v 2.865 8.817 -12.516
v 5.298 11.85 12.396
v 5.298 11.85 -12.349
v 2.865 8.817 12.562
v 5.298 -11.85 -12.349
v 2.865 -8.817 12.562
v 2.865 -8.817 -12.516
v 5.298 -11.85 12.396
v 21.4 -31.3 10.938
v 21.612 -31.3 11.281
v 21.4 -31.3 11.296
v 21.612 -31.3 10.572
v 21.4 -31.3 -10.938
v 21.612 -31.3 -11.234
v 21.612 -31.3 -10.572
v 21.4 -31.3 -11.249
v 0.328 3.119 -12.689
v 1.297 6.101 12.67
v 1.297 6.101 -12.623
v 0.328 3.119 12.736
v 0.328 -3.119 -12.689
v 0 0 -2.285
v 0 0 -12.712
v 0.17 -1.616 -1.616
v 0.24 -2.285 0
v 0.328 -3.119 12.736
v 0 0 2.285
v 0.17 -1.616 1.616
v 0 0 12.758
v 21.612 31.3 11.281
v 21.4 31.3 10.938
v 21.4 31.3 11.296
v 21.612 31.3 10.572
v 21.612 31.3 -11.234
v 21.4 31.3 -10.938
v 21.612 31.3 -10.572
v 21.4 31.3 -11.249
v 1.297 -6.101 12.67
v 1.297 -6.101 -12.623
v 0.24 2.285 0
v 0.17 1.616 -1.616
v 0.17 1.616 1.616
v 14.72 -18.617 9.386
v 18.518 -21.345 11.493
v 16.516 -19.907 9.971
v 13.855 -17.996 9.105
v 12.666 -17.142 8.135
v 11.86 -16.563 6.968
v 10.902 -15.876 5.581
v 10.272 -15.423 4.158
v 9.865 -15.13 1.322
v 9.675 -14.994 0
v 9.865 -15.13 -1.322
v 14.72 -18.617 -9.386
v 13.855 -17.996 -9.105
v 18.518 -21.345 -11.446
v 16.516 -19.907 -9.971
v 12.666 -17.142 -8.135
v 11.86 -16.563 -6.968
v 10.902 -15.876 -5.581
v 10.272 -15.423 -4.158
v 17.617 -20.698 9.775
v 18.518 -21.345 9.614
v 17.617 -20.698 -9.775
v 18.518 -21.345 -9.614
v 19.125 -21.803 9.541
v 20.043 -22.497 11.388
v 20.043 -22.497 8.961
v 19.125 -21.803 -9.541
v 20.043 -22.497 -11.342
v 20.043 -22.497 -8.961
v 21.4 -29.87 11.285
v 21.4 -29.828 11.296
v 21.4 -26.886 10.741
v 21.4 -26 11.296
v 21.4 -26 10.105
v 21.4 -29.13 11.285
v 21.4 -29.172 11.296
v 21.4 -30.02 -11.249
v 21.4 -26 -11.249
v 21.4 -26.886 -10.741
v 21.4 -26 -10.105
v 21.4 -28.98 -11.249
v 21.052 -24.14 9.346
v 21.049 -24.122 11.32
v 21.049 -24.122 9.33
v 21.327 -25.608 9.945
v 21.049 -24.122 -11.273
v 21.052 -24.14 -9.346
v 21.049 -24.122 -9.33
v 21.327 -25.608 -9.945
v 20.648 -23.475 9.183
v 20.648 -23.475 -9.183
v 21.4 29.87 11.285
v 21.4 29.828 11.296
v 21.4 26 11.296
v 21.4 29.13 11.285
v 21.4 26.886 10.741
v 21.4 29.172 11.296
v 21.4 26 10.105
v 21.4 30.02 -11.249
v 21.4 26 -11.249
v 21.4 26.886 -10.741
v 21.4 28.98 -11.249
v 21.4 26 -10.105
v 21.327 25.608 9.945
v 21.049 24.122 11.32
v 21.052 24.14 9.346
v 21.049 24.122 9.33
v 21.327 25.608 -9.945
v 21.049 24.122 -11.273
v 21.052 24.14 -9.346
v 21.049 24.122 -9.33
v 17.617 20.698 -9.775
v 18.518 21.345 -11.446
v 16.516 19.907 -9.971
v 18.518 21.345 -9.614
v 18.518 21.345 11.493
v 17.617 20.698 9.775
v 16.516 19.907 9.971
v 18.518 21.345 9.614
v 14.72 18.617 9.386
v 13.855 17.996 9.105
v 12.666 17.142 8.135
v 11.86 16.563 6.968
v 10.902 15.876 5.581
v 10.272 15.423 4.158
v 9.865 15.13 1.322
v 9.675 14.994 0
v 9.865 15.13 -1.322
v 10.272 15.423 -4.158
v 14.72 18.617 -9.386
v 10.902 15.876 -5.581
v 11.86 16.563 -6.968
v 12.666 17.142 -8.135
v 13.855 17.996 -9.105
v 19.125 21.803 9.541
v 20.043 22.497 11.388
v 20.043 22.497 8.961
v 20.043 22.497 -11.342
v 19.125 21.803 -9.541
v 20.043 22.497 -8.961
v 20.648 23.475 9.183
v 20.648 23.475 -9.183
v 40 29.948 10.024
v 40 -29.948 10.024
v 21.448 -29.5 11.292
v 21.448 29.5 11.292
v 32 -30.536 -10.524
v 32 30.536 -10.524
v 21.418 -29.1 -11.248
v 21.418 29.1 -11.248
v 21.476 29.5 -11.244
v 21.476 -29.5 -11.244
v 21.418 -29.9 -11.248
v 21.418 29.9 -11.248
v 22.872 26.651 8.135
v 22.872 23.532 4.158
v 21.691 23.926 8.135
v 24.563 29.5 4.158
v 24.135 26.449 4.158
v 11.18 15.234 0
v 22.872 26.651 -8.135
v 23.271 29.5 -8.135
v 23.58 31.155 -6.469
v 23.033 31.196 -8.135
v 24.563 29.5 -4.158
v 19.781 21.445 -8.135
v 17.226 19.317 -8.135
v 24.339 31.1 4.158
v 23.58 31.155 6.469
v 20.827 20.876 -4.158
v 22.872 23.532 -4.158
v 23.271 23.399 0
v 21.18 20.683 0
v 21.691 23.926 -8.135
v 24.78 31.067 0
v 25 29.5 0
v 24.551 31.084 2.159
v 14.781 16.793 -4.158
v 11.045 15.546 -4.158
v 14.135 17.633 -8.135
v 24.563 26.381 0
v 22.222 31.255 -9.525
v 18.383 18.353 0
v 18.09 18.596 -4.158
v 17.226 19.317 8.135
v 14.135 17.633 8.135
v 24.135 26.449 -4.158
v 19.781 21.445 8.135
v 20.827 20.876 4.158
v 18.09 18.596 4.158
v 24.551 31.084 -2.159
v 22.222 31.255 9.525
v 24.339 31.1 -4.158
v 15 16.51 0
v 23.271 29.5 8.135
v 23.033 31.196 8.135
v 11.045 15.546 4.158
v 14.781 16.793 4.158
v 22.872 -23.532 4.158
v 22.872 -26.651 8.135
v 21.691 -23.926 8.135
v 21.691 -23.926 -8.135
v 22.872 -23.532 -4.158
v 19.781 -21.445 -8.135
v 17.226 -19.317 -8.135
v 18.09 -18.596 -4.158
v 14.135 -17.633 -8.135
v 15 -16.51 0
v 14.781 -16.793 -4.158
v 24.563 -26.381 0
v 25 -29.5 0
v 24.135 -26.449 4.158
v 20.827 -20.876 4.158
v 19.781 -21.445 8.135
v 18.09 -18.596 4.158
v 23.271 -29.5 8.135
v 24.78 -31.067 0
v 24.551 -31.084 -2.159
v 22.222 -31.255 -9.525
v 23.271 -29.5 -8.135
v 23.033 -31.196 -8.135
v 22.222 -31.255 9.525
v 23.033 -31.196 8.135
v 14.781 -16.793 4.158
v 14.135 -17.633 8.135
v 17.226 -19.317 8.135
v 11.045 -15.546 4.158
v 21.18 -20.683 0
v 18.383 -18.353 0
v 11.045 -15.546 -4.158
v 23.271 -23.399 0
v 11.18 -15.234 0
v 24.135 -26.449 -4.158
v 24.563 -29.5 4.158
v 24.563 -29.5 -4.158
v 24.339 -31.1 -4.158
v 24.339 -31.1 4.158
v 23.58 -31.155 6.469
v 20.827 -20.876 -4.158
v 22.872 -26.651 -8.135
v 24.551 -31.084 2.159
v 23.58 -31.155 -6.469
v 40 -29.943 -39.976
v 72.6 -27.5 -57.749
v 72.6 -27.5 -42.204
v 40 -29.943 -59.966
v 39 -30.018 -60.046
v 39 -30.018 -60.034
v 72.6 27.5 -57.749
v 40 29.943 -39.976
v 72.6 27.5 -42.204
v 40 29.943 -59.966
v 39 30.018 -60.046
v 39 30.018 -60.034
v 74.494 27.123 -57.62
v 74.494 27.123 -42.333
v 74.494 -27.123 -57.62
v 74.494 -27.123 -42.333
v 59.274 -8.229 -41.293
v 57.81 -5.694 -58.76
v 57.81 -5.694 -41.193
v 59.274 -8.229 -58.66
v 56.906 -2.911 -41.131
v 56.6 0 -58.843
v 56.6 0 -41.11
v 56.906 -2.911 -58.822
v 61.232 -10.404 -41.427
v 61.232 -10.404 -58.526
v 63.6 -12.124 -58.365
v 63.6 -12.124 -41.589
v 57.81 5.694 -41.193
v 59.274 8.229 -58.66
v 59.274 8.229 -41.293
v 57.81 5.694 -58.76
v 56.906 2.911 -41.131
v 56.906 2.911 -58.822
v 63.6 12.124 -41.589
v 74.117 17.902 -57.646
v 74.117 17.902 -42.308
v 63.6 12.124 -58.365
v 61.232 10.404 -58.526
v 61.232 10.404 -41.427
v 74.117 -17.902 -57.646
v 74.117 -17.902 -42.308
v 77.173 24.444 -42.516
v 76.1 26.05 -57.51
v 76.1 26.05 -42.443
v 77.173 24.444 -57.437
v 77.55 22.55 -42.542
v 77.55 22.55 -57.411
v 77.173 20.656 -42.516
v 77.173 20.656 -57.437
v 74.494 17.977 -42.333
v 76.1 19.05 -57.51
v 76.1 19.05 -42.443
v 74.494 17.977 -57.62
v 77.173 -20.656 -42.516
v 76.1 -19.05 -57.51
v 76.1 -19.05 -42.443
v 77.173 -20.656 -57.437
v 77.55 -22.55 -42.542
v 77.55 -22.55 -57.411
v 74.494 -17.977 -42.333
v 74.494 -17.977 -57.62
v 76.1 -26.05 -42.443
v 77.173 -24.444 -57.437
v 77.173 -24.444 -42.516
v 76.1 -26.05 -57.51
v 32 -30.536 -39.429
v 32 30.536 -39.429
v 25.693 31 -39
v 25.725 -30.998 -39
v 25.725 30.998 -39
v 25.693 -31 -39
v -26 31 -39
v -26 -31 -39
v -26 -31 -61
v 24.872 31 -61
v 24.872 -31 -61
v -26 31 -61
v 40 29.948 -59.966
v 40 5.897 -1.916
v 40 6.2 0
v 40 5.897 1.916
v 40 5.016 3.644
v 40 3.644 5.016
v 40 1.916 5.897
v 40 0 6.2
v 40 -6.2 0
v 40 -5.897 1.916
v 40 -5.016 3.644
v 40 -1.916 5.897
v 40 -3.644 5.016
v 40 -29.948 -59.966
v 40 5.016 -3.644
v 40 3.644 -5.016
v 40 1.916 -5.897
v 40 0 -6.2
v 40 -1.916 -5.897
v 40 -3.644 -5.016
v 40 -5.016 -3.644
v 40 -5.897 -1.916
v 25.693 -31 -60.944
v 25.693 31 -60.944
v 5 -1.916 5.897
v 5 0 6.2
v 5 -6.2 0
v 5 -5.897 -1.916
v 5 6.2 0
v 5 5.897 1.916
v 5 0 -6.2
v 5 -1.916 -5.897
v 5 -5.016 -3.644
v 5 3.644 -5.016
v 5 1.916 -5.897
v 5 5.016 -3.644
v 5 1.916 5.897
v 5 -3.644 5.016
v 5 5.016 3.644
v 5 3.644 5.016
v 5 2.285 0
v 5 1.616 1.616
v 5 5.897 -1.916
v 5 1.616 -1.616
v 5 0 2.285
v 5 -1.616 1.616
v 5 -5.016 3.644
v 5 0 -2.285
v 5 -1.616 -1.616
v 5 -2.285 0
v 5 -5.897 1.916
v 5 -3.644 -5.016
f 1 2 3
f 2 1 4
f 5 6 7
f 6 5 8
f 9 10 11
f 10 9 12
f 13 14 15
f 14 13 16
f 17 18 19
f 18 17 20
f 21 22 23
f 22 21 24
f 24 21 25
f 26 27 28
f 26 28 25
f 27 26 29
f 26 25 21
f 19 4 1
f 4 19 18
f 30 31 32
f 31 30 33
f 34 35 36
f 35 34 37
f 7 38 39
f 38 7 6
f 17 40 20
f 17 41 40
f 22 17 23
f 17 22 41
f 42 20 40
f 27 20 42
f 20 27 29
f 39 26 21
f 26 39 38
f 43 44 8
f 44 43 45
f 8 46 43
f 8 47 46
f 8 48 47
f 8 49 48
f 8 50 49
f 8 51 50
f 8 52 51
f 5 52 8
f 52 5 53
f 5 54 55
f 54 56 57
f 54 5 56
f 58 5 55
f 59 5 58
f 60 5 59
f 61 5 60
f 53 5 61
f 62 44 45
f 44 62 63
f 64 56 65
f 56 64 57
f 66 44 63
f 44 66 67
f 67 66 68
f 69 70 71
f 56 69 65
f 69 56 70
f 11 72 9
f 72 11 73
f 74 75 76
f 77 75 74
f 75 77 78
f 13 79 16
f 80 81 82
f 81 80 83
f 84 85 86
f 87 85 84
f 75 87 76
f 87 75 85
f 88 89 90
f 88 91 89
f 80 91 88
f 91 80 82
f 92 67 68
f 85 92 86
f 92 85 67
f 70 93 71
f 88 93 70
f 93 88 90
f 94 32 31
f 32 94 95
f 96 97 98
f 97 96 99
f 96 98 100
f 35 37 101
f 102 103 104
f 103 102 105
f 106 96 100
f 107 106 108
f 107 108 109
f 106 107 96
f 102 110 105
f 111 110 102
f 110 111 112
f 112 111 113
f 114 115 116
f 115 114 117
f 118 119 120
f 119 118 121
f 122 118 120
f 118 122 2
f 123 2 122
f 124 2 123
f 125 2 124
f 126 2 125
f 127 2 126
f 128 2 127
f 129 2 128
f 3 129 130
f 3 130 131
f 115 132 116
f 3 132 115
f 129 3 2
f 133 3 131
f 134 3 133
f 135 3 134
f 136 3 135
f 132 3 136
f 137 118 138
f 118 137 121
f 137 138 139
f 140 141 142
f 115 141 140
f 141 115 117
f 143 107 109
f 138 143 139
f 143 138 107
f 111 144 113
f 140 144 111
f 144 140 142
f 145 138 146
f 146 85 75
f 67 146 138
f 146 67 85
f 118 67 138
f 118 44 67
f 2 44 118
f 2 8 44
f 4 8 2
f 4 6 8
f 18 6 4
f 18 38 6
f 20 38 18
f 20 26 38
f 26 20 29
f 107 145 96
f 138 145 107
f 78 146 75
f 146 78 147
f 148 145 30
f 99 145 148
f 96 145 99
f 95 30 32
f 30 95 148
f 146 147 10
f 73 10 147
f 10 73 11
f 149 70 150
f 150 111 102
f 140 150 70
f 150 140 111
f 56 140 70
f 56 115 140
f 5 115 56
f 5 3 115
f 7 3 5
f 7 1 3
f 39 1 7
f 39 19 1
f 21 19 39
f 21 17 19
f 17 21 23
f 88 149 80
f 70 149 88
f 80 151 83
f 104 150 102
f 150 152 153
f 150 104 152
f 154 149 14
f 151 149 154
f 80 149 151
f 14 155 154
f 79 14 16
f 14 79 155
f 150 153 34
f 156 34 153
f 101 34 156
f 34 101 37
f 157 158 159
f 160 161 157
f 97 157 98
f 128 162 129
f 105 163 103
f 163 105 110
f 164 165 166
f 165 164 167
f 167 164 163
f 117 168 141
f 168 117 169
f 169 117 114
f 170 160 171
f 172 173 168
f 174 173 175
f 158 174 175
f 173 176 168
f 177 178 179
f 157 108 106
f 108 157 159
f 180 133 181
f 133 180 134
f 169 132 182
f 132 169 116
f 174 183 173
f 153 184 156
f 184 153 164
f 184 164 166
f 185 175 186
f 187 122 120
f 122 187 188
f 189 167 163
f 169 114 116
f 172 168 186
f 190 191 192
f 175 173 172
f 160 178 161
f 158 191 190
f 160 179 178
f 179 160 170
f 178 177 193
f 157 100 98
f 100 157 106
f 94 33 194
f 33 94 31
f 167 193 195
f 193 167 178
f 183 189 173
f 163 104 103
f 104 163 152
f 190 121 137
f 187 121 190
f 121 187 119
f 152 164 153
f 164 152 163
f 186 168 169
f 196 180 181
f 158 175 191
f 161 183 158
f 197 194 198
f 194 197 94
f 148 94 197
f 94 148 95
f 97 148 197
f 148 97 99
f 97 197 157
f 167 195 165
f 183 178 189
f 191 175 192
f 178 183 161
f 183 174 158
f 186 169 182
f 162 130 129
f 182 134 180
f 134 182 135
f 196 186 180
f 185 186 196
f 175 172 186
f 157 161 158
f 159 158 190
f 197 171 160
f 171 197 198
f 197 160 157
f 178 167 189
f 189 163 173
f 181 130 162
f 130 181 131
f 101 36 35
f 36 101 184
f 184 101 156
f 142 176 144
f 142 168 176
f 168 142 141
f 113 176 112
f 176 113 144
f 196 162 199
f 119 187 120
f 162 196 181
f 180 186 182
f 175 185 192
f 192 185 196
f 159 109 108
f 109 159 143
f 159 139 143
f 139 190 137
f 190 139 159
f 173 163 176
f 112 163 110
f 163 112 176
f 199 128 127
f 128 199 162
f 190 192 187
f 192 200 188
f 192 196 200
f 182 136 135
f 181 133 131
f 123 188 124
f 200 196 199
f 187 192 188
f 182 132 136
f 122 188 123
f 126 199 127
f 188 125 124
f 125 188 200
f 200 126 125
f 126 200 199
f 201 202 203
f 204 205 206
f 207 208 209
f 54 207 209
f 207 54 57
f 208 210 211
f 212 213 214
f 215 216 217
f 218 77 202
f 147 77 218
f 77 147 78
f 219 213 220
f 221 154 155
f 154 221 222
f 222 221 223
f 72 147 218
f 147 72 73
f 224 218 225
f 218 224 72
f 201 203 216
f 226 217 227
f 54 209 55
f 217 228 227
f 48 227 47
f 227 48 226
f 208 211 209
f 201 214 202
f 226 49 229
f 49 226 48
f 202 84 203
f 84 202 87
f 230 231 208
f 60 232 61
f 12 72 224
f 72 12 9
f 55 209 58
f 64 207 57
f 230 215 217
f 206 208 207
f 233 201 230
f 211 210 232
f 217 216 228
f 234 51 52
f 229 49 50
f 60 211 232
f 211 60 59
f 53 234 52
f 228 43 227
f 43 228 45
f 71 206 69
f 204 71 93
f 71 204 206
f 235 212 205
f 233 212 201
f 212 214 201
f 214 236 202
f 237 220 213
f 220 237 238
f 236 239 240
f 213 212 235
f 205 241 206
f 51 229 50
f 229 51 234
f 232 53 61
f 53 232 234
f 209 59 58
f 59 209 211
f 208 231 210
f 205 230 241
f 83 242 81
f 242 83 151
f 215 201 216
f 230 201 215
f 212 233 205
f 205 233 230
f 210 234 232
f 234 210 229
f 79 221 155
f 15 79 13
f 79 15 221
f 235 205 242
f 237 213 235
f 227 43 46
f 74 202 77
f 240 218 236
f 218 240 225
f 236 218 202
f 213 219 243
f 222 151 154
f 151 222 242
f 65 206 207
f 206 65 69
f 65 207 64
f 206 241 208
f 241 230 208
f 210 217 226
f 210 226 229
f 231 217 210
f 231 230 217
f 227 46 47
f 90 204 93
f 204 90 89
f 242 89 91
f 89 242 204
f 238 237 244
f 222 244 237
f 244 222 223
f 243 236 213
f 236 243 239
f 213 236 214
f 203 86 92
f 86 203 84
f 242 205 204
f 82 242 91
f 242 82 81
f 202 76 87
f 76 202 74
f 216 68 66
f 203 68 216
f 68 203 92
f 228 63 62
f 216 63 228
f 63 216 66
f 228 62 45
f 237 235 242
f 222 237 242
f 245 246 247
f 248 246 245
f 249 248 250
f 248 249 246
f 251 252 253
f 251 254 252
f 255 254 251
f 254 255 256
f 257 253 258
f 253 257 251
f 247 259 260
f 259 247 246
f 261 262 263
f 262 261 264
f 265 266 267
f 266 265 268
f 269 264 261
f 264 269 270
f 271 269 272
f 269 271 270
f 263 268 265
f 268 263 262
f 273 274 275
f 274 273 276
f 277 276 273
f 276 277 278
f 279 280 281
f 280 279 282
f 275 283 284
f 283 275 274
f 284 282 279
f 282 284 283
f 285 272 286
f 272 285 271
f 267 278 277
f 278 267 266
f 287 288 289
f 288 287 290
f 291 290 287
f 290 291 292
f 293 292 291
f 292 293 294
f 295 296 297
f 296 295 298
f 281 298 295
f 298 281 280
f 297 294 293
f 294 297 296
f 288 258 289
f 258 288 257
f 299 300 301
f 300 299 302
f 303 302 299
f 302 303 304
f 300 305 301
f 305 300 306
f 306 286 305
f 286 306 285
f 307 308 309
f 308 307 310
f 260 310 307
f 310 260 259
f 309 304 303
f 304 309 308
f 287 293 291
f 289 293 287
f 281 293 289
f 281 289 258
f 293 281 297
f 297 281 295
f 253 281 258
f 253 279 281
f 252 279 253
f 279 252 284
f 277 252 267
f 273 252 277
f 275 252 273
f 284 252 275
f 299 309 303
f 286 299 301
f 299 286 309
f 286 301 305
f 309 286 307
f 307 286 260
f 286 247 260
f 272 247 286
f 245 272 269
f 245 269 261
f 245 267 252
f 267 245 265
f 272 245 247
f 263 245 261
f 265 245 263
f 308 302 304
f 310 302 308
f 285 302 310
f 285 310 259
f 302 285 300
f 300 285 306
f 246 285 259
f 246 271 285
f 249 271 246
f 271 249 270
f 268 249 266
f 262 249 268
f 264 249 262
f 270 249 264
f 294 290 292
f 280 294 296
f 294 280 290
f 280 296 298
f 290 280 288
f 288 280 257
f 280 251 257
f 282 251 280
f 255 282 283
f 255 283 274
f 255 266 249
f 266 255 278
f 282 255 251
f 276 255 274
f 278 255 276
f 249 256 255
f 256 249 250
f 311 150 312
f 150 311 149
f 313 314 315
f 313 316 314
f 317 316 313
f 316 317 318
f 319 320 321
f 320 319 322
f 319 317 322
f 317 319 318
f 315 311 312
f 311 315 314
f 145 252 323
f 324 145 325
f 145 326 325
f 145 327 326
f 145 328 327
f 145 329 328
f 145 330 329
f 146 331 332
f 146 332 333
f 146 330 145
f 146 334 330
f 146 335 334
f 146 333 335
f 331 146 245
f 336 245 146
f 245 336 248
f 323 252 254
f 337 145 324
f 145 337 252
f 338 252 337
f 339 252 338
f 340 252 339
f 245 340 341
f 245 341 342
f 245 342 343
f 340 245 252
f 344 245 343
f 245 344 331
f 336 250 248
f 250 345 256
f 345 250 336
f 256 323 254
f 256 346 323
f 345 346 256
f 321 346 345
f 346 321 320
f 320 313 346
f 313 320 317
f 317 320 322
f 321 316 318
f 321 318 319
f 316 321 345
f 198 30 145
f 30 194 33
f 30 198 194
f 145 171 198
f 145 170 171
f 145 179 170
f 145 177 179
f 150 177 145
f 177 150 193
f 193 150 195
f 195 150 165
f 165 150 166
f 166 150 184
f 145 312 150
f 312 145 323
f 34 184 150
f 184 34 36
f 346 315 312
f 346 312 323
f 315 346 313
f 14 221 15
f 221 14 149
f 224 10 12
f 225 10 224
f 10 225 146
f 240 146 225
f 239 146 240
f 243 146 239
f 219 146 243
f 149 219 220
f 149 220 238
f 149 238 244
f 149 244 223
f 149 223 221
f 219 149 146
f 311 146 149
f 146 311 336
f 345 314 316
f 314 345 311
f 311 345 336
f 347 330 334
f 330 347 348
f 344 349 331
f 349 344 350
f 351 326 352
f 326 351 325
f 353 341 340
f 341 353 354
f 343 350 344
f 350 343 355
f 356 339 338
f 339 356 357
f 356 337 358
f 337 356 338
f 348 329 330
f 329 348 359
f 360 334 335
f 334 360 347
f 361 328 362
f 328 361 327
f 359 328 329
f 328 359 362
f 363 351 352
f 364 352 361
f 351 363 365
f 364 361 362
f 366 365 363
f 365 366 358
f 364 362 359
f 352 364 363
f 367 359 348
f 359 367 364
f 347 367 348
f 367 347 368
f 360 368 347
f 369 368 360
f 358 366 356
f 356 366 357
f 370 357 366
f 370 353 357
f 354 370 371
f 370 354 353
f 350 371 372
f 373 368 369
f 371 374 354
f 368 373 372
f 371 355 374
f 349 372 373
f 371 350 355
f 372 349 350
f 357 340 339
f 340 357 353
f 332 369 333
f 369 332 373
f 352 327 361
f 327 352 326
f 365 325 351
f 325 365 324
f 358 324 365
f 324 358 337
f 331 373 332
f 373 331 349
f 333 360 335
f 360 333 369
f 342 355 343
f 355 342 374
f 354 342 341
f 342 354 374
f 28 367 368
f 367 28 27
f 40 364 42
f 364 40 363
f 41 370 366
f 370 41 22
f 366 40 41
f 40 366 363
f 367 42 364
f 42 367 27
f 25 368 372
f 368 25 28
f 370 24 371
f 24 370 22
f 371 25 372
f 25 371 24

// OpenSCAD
// Matthew Sparks
// 2016-02-13
//
// units in 1mm
// Shim for scoped rifles in Stack-On gun cabinet model GCG-14P
// with adjustable drop section for shorter rifles
//
// Rev A - Trimmed sides flat to allow shims to be positioned in
//          adjacent slots.

// Changes the overall height of the shim.
dropDistance = 50;
// Changes the thickness of the vertical piece.
dropThickness = 8;
// Determines how far from the rear of the shim to place the vertical.
dropToBack = 40;
// Changes the length of the rear support.
rearDistance = 26;


difference(){ // trim sides
    union(){
        // top original section
        difference(){
            difference(){//cut taper
                union(){// re-add rounded edge
                    difference(){//cut curves
                        hull(){//main body
                        translate([15,0,0]){
                            cylinder(26.2,r=15,center=true);
                        }
                        translate([72.6,22.55,0]){
                            cylinder(26.2,d=9.9,center=true);
                        }
                        translate([72.6,-22.55,0]){
                            cylinder(26.2,d=9.9,center=true);
                        }
                        translate([21.4,30.8,0]){
                            cube([1,1,26.2],true);
                        }
                        translate([21.4,-30.8,0]){
                            cube([1,1,26.2],true);
                        }
                        }
                        //end main body


                        hull(){//back curve
                        translate([16.2,-26,0]){
                            cylinder(30,r=5.2,center=true);
                        }
                        translate([16.2,-40,0]){
                            cylinder(30,r=5.2,center=true);
                        }
                        translate([-20,0,0]){
                            cylinder(30,r=5.2,center=true);
                        }
                        }
                        hull(){
                        translate([16.2,26,0]){
                            cylinder(30,r=5.2,center=true);
                        }
                        translate([16.2,40,0]){
                            cylinder(30,r=5.2,center=true);
                        }
                        translate([-20,0,0]){
                            cylinder(30,r=5.2,center=true);
                        }
                        }//end back curve



                        hull(){//front curve
                        translate([94,22.55,0]){
                            cylinder(30,r=5.5,center=true);
                        }
                        translate([94,-22.55,0]){
                            cylinder(30,r=5.5,center=true);
                        }
                        translate([70.6,0,0]){
                            cylinder(30,r=14,center=true);
                        }
                        }        //end front curve
                        
                        // front edge
                        translate([84.15,0,0]){
                            cube([20,70,30],true);
                        } // end front edge
                        
                    }// end cut curves

                    // rounded edge
                    translate([72.6,22.55,0]){
                        cylinder(26.2,d=9.9,center=true);
                    }
                    translate([72.6,-22.55,0]){
                        cylinder(26.2,d=9.9,center=true);
                    } // end rounded edge
                } // end re-add rounded edge


                //taper top/bottom
                translate([-5,-32.5,13.1]){
                rotate(a=3.91,v=[0,1,0]){
                    cube([90,65,20]);
                }
                }
                translate([-5,-32.5,-33.1]){
                rotate(a=-3.91,v=[0,1,0]){
                    cube([90,65,20]);
                }
                }// end taper top/bottom
                
                // top bevel curve
                translate([5,29.5,0]){
                scale([1,0.75,1]){
                    sphere(d=40,center=true);
                }
                } // end top bevel curve

                // bottom bevel curve
                translate([5,-29.5,0]){
                scale([1,0.75,1]){
                    sphere(d=40,center=true);
                }
                } // end bottom bevel curve    
            } // end cut taper
            
            // cut off front
            translate([((dropToBack+(100-dropToBack)/2)-dropThickness)+1,0,0]){
                cube([(100-dropToBack),100,50],true);
            } // end cut off front
        }
        // end top original section

        // bottom original section
        difference(){    
            // original piece
            translate([0,0,-dropDistance]){
                difference(){//cut taper and holes
                    union(){// re-add rounded edge
                        difference(){//cut curves
                            hull(){//main body
                            translate([15,0,0]){
                                cylinder(26.2,r=15,center=true);
                            }
                            translate([72.6,22.55,0]){
                                cylinder(26.2,d=9.9,center=true);
                            }
                            translate([72.6,-22.55,0]){
                                cylinder(26.2,d=9.9,center=true);
                            }
                            translate([21.4,30.8,0]){
                                cube([1,1,26.2],true);
                            }
                            translate([21.4,-30.8,0]){
                                cube([1,1,26.2],true);
                            }
                            }
                            //end main body


                            hull(){//back curve
                            translate([16.2,-26,0]){
                                cylinder(30,r=5.2,center=true);
                            }
                            translate([16.2,-40,0]){
                                cylinder(30,r=5.2,center=true);
                            }
                            translate([-20,0,0]){
                                cylinder(30,r=5.2,center=true);
                            }
                            }
                            hull(){
                            translate([16.2,26,0]){
                                cylinder(30,r=5.2,center=true);
                            }
                            translate([16.2,40,0]){
                                cylinder(30,r=5.2,center=true);
                            }
                            translate([-20,0,0]){
                                cylinder(30,r=5.2,center=true);
                            }
                            }//end back curve



                            hull(){//front curve
                            translate([94,22.55,0]){
                                cylinder(30,r=5.5,center=true);
                            }
                            translate([94,-22.55,0]){
                                cylinder(30,r=5.5,center=true);
                            }
                            translate([70.6,0,0]){
                                cylinder(30,r=14,center=true);
                            }
                            }        //end front curve
                            
                            // front edge
                            translate([84.15,0,0]){
                                cube([20,70,30],true);
                            } // end front edge
                            
                        }// end cut curves

                        // rounded edge
                        translate([72.6,22.55,0]){
                            cylinder(26.2,d=9.9,center=true);
                        }
                        translate([72.6,-22.55,0]){
                            cylinder(26.2,d=9.9,center=true);
                        } // end rounded edge
                        
                    } // end re-add rounded edge


                    //taper top/bottom
                    translate([-5,-32.5,13.1]){
                    rotate(a=3.91,v=[0,1,0]){
                        cube([90,65,20]);
                    }
                    }
                    translate([-5,-32.5,-33.1]){
                    rotate(a=-3.91,v=[0,1,0]){
                        cube([90,65,20]);
                    }
                    }// end taper top/bottom
                    
                    // top bevel curve
                    translate([5,29.5,0]){
                    scale([1,0.75,1]){
                        sphere(d=40,center=true);
                    }
                    } // end top bevel curve

                    // bottom bevel curve
                    translate([5,-29.5,0]){
                    scale([1,0.75,1]){
                        sphere(d=40,center=true);
                    }
                    } // end bottom bevel curve    
                } // end cut taper and holes
            }   // end original piece

            // cut off rear
            translate([(dropToBack/2)-1,0,-dropDistance]){
                cube([dropToBack,100,50],true);
            } // end cut off rear
        }
        // end bottom original section
        
        // additional sections
        difference(){
            
            union(){
                // drop section
                translate([(dropToBack-(dropThickness/2)),0,-(dropDistance/2)]){
                    cube([dropThickness,70,dropDistance+50],true);
                }
                
                // rear section
                difference(){
                    translate([((dropToBack-dropThickness)-(((dropToBack-dropThickness)+rearDistance)/2)),0,-(dropDistance)]){
                        cube([((dropToBack-dropThickness)+rearDistance),80,22],true);
                    }
                    translate([-5,-50,13.1-dropDistance]){
                        rotate(a=3.91,v=[0,1,0]){
                            translate([-50,0,0]){
                                cube([150,100,25]);
                            }
                        }
                    }
                }// end rear section
            }
            
            //taper top/bottom
            translate([-5,-50,13.1]){
                rotate(a=3.91,v=[0,1,0]){
                    cube([90,100,50]);
                }
            }
            translate([-5,-50,-(dropDistance+38.1)]){
                rotate(a=-3.91,v=[0,1,0]){
                    translate([-50,0,0]){
                        cube([150,100,25]);
                    }
                }
            }
            translate([-50,31,-(dropDistance+20)]){
                cube([150,100,40]);
            }
            translate([-50,-131,-(dropDistance+20)]){
                cube([150,100,40]);
            }// end taper top/bottom
        }
        // end additional sections
    }
    
    // trim edges
    //top edge
    translate([0,0,0]){
        rotate(a=-4.203736,v=[0,0,1]){
            translate([-50,32.8,-(dropDistance+25)]){
                cube([150,65,dropDistance+50]);
            }
        }
    }
    // end top edge
    
    // bottom edge
    translate([0,0,0]){
        rotate(a=4.203736,v=[0,0,1]){
            translate([-50,-97.8,-(dropDistance+25)]){
                cube([150,65,dropDistance+50]);
            }
        }
    }
    // end bottom edge
    
    // main hole
    translate([44.3,0,0]){
    rotate([0,90,0]){
        cylinder(78.6,d=12.4,center=true);
    }
    } // end main hole
    
    // screw hole
    translate([20,0,0]){
    rotate([0,90,0]){
        cylinder(78.6,d=4.57,center=true);
    }
    } // end screw hole
}
